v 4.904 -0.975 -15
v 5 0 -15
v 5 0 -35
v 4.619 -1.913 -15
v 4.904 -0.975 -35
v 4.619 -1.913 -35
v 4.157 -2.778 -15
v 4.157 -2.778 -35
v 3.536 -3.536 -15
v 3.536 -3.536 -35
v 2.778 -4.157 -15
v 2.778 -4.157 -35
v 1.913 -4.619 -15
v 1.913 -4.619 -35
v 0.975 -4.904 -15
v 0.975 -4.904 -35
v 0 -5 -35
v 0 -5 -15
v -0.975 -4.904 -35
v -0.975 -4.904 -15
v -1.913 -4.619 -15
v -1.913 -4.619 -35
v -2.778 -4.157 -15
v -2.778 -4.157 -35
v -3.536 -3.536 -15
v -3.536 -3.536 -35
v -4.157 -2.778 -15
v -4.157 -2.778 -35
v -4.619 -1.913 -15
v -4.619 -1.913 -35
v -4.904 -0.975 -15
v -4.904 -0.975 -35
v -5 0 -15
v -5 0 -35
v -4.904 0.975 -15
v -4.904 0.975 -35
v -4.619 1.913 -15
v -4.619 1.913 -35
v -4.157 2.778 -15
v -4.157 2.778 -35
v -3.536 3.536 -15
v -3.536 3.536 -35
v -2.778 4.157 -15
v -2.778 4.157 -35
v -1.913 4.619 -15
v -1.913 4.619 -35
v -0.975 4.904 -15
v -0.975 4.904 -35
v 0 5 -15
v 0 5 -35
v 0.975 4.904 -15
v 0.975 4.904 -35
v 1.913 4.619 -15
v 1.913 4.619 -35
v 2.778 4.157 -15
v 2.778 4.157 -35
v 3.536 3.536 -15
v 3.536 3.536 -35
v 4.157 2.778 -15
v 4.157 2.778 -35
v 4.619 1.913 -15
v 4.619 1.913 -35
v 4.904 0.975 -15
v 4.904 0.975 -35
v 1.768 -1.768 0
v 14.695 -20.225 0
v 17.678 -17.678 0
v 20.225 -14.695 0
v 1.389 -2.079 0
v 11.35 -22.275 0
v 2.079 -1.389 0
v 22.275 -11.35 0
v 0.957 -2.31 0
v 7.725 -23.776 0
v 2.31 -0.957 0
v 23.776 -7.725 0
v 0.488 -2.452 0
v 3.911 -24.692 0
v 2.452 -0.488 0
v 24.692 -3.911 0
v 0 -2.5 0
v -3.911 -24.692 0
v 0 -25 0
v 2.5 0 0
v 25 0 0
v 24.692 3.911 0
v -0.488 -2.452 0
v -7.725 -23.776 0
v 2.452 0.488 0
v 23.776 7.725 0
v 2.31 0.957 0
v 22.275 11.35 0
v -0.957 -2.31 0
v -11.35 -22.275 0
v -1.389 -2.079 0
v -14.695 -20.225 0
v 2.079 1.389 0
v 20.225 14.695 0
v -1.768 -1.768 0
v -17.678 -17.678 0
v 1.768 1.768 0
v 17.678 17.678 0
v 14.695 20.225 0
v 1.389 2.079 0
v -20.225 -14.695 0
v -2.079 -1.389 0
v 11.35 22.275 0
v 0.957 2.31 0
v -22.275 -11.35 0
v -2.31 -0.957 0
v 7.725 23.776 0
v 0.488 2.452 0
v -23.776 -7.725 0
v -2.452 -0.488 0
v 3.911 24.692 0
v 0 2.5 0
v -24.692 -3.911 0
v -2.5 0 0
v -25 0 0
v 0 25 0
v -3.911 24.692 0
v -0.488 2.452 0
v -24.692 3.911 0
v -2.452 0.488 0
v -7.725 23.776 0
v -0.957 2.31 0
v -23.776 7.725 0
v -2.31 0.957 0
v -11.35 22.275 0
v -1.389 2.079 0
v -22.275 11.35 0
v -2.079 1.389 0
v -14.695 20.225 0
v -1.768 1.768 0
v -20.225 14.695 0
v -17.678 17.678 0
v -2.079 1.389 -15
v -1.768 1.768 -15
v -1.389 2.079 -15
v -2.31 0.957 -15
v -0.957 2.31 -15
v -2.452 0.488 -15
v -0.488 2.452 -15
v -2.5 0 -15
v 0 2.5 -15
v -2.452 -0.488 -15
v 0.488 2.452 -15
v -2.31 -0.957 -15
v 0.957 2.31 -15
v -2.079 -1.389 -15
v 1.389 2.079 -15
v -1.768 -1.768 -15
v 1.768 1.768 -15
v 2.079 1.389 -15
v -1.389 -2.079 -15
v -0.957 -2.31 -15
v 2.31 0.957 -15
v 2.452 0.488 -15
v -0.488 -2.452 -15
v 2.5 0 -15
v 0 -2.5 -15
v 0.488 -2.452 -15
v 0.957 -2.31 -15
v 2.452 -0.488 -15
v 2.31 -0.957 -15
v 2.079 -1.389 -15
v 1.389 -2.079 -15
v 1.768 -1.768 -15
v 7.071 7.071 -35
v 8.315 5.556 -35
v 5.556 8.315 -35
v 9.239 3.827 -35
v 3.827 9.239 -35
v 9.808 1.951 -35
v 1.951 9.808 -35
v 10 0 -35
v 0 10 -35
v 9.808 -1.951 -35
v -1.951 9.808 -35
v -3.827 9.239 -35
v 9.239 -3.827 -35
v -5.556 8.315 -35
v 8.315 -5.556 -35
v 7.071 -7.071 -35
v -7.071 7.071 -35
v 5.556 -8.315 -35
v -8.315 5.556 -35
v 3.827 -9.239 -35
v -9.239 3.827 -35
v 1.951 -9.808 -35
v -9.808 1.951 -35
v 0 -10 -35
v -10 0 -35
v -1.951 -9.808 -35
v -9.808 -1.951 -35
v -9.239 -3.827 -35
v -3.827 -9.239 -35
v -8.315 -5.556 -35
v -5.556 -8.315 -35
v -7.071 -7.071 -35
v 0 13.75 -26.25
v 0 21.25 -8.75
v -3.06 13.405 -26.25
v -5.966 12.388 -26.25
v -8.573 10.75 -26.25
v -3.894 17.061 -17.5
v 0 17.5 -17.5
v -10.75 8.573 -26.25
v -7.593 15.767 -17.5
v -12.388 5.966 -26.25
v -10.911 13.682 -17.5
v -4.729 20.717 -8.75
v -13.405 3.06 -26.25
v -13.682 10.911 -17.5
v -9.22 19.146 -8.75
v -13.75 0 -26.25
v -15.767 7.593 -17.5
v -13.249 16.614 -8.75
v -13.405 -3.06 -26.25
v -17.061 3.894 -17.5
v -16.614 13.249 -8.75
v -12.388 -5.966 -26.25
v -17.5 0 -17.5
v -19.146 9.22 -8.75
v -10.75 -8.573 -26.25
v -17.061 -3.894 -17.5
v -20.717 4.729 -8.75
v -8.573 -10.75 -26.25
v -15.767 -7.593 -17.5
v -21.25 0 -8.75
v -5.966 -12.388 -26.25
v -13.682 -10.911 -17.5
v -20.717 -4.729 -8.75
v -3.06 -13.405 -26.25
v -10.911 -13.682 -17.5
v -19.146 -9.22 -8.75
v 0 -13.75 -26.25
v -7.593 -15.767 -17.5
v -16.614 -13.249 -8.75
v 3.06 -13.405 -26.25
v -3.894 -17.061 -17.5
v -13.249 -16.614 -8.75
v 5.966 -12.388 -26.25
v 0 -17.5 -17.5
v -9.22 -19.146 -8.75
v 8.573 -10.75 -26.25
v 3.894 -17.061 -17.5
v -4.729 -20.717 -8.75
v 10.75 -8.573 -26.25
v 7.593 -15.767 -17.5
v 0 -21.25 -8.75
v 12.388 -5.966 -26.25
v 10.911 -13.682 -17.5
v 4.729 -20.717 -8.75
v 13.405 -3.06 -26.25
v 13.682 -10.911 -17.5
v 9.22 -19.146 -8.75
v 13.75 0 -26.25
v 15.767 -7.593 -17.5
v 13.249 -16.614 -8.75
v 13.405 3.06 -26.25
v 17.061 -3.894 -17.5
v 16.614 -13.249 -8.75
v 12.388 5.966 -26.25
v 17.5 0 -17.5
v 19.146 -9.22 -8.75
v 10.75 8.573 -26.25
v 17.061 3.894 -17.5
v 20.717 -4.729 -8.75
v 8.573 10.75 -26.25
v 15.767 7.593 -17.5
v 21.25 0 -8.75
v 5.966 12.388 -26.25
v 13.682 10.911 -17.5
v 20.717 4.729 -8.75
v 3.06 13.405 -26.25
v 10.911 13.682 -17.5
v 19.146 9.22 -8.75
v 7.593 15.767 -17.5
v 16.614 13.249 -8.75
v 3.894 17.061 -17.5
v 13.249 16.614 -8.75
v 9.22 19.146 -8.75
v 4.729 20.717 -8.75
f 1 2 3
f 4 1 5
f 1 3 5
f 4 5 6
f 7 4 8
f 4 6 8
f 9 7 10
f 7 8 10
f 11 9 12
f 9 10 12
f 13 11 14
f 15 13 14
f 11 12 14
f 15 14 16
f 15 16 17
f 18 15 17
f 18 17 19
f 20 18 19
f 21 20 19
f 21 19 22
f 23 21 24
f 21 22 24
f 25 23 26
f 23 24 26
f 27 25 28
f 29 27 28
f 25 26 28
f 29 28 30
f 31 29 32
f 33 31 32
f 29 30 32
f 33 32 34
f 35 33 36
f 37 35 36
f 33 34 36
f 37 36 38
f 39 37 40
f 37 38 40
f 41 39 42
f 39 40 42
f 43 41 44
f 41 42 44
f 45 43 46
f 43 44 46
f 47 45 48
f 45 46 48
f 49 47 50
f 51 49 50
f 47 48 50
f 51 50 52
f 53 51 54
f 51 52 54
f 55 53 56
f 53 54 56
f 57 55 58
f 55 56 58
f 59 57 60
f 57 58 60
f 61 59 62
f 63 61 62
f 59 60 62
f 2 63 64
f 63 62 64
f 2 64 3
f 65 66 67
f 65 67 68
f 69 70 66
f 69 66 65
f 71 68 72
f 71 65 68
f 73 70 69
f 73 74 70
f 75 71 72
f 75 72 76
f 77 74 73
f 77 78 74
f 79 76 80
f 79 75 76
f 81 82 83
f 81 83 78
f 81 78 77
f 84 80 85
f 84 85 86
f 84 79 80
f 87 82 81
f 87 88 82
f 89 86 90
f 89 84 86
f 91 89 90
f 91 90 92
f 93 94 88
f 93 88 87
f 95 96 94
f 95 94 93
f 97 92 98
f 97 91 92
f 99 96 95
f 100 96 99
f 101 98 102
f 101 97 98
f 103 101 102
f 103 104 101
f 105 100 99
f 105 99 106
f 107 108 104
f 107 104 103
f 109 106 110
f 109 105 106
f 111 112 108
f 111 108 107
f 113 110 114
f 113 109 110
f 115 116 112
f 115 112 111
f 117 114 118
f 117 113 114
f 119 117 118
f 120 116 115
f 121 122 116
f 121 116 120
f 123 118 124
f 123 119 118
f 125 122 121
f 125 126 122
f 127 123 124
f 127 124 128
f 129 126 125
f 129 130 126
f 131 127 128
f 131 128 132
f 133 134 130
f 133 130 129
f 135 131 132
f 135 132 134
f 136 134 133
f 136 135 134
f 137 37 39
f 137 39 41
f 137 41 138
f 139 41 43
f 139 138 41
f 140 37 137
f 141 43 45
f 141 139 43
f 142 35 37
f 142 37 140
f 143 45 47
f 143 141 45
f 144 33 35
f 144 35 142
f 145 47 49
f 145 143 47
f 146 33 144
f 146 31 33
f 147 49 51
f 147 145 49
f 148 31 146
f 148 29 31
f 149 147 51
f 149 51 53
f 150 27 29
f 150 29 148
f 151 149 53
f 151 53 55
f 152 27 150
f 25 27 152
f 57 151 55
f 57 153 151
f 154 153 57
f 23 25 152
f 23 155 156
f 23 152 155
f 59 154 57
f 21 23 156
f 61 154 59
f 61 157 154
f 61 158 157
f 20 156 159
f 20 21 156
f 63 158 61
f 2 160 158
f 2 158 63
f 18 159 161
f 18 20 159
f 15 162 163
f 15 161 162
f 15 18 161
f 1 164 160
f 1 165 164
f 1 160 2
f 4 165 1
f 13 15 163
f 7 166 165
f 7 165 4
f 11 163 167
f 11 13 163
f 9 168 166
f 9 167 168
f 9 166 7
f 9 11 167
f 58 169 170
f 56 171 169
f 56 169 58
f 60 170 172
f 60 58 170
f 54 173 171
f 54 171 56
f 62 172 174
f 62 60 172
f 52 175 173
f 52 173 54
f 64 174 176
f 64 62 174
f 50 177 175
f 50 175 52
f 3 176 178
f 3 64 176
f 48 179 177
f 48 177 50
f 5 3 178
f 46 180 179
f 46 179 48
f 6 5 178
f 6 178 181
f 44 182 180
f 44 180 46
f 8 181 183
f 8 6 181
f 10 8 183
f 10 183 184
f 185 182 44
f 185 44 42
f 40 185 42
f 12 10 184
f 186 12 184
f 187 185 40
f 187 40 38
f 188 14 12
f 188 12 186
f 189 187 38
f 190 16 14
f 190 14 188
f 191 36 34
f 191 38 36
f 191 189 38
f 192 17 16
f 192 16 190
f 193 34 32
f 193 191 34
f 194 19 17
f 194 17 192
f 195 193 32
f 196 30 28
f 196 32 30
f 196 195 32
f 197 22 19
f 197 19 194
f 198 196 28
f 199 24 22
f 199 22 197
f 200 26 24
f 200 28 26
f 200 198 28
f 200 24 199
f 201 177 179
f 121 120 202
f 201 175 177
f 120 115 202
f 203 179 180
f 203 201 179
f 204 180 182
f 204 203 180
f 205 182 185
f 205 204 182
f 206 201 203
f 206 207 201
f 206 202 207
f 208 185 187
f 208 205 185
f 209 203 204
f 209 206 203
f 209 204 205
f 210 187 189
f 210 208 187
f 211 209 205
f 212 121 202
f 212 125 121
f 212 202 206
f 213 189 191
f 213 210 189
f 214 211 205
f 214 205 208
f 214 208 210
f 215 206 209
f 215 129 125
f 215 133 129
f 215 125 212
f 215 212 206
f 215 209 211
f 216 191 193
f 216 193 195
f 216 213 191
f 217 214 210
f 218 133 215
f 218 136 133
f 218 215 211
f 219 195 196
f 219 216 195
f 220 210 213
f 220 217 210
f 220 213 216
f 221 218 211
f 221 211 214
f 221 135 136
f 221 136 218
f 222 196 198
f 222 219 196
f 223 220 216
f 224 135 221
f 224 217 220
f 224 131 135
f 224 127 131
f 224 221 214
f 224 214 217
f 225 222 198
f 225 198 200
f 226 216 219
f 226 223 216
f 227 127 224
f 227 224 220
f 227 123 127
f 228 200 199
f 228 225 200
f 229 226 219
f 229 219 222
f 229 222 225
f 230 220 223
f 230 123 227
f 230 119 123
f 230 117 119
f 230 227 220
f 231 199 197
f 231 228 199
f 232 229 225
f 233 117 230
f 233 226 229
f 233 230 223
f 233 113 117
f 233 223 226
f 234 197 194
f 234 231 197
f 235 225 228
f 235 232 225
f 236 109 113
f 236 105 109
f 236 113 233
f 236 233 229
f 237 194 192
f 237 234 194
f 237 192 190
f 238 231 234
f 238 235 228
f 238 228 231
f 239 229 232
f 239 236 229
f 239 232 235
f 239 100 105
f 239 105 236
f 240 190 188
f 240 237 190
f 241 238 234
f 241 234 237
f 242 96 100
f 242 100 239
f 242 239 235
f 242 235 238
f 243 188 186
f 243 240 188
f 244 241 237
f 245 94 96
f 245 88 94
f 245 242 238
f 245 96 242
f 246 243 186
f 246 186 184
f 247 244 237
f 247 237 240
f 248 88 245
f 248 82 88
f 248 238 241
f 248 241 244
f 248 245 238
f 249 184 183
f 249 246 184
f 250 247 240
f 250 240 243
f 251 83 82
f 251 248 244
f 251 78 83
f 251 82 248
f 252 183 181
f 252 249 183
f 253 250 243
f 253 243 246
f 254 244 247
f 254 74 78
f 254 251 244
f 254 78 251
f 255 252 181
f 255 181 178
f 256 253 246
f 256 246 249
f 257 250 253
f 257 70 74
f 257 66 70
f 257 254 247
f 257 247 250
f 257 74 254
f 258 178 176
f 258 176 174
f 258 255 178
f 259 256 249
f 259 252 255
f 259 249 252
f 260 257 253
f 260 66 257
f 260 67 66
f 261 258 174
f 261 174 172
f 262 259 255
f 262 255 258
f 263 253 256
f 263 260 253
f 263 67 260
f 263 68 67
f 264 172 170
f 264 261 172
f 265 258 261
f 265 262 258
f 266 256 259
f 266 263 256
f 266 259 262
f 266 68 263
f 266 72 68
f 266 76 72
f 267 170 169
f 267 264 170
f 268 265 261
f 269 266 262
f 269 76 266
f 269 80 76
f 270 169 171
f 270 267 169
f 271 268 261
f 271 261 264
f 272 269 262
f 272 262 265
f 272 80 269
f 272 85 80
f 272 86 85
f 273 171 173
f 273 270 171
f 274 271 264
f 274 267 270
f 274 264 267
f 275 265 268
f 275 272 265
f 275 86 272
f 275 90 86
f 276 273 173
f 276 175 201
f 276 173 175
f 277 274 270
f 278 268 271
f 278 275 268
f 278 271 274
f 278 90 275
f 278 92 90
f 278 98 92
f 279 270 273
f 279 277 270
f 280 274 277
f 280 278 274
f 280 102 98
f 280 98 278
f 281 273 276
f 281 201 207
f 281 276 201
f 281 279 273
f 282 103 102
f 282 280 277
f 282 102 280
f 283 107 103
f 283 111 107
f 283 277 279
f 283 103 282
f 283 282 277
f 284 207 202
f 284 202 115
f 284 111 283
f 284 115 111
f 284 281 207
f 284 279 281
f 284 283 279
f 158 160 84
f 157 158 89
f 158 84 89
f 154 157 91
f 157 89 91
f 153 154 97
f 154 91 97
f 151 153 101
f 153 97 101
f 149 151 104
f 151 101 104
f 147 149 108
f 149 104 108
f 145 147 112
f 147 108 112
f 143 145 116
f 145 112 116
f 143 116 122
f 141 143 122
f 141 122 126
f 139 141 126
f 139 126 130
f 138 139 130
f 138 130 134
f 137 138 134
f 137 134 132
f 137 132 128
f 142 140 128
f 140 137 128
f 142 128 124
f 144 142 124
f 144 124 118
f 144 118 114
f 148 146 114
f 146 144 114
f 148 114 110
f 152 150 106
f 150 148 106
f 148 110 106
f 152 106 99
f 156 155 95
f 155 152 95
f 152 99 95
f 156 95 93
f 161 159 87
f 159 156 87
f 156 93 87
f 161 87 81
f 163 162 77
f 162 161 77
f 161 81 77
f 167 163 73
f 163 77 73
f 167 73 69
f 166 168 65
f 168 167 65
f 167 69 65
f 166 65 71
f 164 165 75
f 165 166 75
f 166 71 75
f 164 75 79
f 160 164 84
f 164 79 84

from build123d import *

# Parameters (mm, degrees)
F2_R     = 2.5
F3_DEPTH = 35.001
F4_R     = 5
F4_R_2   = 2.5
F5_DEPTH = 20


with BuildPart() as f1:
    # F0 (on Right) → F1 (revolve)
    with BuildSketch(Plane.YZ):
        Polygon((25, 0), (0, 0), (0, -35), (10, -35), align=None)
    revolve(axis=Axis((0, 0, -17.5), (0, 0, 1)))

    # F2 (on face) → F3 (cut, through all)
    with BuildSketch(Plane.XY):
        Circle(F2_R)
    extrude(amount=-F3_DEPTH, mode=Mode.SUBTRACT)

    # F4 (on face) → F5 (cut)
    with BuildSketch(Plane(origin=(0, 0, -35), x_dir=(1, 0, 0), z_dir=(0, 0, -1))):
        Circle(F4_R)
        Circle(F4_R_2, mode=Mode.SUBTRACT)
    extrude(amount=-F5_DEPTH, mode=Mode.SUBTRACT)


solid = f1.part
